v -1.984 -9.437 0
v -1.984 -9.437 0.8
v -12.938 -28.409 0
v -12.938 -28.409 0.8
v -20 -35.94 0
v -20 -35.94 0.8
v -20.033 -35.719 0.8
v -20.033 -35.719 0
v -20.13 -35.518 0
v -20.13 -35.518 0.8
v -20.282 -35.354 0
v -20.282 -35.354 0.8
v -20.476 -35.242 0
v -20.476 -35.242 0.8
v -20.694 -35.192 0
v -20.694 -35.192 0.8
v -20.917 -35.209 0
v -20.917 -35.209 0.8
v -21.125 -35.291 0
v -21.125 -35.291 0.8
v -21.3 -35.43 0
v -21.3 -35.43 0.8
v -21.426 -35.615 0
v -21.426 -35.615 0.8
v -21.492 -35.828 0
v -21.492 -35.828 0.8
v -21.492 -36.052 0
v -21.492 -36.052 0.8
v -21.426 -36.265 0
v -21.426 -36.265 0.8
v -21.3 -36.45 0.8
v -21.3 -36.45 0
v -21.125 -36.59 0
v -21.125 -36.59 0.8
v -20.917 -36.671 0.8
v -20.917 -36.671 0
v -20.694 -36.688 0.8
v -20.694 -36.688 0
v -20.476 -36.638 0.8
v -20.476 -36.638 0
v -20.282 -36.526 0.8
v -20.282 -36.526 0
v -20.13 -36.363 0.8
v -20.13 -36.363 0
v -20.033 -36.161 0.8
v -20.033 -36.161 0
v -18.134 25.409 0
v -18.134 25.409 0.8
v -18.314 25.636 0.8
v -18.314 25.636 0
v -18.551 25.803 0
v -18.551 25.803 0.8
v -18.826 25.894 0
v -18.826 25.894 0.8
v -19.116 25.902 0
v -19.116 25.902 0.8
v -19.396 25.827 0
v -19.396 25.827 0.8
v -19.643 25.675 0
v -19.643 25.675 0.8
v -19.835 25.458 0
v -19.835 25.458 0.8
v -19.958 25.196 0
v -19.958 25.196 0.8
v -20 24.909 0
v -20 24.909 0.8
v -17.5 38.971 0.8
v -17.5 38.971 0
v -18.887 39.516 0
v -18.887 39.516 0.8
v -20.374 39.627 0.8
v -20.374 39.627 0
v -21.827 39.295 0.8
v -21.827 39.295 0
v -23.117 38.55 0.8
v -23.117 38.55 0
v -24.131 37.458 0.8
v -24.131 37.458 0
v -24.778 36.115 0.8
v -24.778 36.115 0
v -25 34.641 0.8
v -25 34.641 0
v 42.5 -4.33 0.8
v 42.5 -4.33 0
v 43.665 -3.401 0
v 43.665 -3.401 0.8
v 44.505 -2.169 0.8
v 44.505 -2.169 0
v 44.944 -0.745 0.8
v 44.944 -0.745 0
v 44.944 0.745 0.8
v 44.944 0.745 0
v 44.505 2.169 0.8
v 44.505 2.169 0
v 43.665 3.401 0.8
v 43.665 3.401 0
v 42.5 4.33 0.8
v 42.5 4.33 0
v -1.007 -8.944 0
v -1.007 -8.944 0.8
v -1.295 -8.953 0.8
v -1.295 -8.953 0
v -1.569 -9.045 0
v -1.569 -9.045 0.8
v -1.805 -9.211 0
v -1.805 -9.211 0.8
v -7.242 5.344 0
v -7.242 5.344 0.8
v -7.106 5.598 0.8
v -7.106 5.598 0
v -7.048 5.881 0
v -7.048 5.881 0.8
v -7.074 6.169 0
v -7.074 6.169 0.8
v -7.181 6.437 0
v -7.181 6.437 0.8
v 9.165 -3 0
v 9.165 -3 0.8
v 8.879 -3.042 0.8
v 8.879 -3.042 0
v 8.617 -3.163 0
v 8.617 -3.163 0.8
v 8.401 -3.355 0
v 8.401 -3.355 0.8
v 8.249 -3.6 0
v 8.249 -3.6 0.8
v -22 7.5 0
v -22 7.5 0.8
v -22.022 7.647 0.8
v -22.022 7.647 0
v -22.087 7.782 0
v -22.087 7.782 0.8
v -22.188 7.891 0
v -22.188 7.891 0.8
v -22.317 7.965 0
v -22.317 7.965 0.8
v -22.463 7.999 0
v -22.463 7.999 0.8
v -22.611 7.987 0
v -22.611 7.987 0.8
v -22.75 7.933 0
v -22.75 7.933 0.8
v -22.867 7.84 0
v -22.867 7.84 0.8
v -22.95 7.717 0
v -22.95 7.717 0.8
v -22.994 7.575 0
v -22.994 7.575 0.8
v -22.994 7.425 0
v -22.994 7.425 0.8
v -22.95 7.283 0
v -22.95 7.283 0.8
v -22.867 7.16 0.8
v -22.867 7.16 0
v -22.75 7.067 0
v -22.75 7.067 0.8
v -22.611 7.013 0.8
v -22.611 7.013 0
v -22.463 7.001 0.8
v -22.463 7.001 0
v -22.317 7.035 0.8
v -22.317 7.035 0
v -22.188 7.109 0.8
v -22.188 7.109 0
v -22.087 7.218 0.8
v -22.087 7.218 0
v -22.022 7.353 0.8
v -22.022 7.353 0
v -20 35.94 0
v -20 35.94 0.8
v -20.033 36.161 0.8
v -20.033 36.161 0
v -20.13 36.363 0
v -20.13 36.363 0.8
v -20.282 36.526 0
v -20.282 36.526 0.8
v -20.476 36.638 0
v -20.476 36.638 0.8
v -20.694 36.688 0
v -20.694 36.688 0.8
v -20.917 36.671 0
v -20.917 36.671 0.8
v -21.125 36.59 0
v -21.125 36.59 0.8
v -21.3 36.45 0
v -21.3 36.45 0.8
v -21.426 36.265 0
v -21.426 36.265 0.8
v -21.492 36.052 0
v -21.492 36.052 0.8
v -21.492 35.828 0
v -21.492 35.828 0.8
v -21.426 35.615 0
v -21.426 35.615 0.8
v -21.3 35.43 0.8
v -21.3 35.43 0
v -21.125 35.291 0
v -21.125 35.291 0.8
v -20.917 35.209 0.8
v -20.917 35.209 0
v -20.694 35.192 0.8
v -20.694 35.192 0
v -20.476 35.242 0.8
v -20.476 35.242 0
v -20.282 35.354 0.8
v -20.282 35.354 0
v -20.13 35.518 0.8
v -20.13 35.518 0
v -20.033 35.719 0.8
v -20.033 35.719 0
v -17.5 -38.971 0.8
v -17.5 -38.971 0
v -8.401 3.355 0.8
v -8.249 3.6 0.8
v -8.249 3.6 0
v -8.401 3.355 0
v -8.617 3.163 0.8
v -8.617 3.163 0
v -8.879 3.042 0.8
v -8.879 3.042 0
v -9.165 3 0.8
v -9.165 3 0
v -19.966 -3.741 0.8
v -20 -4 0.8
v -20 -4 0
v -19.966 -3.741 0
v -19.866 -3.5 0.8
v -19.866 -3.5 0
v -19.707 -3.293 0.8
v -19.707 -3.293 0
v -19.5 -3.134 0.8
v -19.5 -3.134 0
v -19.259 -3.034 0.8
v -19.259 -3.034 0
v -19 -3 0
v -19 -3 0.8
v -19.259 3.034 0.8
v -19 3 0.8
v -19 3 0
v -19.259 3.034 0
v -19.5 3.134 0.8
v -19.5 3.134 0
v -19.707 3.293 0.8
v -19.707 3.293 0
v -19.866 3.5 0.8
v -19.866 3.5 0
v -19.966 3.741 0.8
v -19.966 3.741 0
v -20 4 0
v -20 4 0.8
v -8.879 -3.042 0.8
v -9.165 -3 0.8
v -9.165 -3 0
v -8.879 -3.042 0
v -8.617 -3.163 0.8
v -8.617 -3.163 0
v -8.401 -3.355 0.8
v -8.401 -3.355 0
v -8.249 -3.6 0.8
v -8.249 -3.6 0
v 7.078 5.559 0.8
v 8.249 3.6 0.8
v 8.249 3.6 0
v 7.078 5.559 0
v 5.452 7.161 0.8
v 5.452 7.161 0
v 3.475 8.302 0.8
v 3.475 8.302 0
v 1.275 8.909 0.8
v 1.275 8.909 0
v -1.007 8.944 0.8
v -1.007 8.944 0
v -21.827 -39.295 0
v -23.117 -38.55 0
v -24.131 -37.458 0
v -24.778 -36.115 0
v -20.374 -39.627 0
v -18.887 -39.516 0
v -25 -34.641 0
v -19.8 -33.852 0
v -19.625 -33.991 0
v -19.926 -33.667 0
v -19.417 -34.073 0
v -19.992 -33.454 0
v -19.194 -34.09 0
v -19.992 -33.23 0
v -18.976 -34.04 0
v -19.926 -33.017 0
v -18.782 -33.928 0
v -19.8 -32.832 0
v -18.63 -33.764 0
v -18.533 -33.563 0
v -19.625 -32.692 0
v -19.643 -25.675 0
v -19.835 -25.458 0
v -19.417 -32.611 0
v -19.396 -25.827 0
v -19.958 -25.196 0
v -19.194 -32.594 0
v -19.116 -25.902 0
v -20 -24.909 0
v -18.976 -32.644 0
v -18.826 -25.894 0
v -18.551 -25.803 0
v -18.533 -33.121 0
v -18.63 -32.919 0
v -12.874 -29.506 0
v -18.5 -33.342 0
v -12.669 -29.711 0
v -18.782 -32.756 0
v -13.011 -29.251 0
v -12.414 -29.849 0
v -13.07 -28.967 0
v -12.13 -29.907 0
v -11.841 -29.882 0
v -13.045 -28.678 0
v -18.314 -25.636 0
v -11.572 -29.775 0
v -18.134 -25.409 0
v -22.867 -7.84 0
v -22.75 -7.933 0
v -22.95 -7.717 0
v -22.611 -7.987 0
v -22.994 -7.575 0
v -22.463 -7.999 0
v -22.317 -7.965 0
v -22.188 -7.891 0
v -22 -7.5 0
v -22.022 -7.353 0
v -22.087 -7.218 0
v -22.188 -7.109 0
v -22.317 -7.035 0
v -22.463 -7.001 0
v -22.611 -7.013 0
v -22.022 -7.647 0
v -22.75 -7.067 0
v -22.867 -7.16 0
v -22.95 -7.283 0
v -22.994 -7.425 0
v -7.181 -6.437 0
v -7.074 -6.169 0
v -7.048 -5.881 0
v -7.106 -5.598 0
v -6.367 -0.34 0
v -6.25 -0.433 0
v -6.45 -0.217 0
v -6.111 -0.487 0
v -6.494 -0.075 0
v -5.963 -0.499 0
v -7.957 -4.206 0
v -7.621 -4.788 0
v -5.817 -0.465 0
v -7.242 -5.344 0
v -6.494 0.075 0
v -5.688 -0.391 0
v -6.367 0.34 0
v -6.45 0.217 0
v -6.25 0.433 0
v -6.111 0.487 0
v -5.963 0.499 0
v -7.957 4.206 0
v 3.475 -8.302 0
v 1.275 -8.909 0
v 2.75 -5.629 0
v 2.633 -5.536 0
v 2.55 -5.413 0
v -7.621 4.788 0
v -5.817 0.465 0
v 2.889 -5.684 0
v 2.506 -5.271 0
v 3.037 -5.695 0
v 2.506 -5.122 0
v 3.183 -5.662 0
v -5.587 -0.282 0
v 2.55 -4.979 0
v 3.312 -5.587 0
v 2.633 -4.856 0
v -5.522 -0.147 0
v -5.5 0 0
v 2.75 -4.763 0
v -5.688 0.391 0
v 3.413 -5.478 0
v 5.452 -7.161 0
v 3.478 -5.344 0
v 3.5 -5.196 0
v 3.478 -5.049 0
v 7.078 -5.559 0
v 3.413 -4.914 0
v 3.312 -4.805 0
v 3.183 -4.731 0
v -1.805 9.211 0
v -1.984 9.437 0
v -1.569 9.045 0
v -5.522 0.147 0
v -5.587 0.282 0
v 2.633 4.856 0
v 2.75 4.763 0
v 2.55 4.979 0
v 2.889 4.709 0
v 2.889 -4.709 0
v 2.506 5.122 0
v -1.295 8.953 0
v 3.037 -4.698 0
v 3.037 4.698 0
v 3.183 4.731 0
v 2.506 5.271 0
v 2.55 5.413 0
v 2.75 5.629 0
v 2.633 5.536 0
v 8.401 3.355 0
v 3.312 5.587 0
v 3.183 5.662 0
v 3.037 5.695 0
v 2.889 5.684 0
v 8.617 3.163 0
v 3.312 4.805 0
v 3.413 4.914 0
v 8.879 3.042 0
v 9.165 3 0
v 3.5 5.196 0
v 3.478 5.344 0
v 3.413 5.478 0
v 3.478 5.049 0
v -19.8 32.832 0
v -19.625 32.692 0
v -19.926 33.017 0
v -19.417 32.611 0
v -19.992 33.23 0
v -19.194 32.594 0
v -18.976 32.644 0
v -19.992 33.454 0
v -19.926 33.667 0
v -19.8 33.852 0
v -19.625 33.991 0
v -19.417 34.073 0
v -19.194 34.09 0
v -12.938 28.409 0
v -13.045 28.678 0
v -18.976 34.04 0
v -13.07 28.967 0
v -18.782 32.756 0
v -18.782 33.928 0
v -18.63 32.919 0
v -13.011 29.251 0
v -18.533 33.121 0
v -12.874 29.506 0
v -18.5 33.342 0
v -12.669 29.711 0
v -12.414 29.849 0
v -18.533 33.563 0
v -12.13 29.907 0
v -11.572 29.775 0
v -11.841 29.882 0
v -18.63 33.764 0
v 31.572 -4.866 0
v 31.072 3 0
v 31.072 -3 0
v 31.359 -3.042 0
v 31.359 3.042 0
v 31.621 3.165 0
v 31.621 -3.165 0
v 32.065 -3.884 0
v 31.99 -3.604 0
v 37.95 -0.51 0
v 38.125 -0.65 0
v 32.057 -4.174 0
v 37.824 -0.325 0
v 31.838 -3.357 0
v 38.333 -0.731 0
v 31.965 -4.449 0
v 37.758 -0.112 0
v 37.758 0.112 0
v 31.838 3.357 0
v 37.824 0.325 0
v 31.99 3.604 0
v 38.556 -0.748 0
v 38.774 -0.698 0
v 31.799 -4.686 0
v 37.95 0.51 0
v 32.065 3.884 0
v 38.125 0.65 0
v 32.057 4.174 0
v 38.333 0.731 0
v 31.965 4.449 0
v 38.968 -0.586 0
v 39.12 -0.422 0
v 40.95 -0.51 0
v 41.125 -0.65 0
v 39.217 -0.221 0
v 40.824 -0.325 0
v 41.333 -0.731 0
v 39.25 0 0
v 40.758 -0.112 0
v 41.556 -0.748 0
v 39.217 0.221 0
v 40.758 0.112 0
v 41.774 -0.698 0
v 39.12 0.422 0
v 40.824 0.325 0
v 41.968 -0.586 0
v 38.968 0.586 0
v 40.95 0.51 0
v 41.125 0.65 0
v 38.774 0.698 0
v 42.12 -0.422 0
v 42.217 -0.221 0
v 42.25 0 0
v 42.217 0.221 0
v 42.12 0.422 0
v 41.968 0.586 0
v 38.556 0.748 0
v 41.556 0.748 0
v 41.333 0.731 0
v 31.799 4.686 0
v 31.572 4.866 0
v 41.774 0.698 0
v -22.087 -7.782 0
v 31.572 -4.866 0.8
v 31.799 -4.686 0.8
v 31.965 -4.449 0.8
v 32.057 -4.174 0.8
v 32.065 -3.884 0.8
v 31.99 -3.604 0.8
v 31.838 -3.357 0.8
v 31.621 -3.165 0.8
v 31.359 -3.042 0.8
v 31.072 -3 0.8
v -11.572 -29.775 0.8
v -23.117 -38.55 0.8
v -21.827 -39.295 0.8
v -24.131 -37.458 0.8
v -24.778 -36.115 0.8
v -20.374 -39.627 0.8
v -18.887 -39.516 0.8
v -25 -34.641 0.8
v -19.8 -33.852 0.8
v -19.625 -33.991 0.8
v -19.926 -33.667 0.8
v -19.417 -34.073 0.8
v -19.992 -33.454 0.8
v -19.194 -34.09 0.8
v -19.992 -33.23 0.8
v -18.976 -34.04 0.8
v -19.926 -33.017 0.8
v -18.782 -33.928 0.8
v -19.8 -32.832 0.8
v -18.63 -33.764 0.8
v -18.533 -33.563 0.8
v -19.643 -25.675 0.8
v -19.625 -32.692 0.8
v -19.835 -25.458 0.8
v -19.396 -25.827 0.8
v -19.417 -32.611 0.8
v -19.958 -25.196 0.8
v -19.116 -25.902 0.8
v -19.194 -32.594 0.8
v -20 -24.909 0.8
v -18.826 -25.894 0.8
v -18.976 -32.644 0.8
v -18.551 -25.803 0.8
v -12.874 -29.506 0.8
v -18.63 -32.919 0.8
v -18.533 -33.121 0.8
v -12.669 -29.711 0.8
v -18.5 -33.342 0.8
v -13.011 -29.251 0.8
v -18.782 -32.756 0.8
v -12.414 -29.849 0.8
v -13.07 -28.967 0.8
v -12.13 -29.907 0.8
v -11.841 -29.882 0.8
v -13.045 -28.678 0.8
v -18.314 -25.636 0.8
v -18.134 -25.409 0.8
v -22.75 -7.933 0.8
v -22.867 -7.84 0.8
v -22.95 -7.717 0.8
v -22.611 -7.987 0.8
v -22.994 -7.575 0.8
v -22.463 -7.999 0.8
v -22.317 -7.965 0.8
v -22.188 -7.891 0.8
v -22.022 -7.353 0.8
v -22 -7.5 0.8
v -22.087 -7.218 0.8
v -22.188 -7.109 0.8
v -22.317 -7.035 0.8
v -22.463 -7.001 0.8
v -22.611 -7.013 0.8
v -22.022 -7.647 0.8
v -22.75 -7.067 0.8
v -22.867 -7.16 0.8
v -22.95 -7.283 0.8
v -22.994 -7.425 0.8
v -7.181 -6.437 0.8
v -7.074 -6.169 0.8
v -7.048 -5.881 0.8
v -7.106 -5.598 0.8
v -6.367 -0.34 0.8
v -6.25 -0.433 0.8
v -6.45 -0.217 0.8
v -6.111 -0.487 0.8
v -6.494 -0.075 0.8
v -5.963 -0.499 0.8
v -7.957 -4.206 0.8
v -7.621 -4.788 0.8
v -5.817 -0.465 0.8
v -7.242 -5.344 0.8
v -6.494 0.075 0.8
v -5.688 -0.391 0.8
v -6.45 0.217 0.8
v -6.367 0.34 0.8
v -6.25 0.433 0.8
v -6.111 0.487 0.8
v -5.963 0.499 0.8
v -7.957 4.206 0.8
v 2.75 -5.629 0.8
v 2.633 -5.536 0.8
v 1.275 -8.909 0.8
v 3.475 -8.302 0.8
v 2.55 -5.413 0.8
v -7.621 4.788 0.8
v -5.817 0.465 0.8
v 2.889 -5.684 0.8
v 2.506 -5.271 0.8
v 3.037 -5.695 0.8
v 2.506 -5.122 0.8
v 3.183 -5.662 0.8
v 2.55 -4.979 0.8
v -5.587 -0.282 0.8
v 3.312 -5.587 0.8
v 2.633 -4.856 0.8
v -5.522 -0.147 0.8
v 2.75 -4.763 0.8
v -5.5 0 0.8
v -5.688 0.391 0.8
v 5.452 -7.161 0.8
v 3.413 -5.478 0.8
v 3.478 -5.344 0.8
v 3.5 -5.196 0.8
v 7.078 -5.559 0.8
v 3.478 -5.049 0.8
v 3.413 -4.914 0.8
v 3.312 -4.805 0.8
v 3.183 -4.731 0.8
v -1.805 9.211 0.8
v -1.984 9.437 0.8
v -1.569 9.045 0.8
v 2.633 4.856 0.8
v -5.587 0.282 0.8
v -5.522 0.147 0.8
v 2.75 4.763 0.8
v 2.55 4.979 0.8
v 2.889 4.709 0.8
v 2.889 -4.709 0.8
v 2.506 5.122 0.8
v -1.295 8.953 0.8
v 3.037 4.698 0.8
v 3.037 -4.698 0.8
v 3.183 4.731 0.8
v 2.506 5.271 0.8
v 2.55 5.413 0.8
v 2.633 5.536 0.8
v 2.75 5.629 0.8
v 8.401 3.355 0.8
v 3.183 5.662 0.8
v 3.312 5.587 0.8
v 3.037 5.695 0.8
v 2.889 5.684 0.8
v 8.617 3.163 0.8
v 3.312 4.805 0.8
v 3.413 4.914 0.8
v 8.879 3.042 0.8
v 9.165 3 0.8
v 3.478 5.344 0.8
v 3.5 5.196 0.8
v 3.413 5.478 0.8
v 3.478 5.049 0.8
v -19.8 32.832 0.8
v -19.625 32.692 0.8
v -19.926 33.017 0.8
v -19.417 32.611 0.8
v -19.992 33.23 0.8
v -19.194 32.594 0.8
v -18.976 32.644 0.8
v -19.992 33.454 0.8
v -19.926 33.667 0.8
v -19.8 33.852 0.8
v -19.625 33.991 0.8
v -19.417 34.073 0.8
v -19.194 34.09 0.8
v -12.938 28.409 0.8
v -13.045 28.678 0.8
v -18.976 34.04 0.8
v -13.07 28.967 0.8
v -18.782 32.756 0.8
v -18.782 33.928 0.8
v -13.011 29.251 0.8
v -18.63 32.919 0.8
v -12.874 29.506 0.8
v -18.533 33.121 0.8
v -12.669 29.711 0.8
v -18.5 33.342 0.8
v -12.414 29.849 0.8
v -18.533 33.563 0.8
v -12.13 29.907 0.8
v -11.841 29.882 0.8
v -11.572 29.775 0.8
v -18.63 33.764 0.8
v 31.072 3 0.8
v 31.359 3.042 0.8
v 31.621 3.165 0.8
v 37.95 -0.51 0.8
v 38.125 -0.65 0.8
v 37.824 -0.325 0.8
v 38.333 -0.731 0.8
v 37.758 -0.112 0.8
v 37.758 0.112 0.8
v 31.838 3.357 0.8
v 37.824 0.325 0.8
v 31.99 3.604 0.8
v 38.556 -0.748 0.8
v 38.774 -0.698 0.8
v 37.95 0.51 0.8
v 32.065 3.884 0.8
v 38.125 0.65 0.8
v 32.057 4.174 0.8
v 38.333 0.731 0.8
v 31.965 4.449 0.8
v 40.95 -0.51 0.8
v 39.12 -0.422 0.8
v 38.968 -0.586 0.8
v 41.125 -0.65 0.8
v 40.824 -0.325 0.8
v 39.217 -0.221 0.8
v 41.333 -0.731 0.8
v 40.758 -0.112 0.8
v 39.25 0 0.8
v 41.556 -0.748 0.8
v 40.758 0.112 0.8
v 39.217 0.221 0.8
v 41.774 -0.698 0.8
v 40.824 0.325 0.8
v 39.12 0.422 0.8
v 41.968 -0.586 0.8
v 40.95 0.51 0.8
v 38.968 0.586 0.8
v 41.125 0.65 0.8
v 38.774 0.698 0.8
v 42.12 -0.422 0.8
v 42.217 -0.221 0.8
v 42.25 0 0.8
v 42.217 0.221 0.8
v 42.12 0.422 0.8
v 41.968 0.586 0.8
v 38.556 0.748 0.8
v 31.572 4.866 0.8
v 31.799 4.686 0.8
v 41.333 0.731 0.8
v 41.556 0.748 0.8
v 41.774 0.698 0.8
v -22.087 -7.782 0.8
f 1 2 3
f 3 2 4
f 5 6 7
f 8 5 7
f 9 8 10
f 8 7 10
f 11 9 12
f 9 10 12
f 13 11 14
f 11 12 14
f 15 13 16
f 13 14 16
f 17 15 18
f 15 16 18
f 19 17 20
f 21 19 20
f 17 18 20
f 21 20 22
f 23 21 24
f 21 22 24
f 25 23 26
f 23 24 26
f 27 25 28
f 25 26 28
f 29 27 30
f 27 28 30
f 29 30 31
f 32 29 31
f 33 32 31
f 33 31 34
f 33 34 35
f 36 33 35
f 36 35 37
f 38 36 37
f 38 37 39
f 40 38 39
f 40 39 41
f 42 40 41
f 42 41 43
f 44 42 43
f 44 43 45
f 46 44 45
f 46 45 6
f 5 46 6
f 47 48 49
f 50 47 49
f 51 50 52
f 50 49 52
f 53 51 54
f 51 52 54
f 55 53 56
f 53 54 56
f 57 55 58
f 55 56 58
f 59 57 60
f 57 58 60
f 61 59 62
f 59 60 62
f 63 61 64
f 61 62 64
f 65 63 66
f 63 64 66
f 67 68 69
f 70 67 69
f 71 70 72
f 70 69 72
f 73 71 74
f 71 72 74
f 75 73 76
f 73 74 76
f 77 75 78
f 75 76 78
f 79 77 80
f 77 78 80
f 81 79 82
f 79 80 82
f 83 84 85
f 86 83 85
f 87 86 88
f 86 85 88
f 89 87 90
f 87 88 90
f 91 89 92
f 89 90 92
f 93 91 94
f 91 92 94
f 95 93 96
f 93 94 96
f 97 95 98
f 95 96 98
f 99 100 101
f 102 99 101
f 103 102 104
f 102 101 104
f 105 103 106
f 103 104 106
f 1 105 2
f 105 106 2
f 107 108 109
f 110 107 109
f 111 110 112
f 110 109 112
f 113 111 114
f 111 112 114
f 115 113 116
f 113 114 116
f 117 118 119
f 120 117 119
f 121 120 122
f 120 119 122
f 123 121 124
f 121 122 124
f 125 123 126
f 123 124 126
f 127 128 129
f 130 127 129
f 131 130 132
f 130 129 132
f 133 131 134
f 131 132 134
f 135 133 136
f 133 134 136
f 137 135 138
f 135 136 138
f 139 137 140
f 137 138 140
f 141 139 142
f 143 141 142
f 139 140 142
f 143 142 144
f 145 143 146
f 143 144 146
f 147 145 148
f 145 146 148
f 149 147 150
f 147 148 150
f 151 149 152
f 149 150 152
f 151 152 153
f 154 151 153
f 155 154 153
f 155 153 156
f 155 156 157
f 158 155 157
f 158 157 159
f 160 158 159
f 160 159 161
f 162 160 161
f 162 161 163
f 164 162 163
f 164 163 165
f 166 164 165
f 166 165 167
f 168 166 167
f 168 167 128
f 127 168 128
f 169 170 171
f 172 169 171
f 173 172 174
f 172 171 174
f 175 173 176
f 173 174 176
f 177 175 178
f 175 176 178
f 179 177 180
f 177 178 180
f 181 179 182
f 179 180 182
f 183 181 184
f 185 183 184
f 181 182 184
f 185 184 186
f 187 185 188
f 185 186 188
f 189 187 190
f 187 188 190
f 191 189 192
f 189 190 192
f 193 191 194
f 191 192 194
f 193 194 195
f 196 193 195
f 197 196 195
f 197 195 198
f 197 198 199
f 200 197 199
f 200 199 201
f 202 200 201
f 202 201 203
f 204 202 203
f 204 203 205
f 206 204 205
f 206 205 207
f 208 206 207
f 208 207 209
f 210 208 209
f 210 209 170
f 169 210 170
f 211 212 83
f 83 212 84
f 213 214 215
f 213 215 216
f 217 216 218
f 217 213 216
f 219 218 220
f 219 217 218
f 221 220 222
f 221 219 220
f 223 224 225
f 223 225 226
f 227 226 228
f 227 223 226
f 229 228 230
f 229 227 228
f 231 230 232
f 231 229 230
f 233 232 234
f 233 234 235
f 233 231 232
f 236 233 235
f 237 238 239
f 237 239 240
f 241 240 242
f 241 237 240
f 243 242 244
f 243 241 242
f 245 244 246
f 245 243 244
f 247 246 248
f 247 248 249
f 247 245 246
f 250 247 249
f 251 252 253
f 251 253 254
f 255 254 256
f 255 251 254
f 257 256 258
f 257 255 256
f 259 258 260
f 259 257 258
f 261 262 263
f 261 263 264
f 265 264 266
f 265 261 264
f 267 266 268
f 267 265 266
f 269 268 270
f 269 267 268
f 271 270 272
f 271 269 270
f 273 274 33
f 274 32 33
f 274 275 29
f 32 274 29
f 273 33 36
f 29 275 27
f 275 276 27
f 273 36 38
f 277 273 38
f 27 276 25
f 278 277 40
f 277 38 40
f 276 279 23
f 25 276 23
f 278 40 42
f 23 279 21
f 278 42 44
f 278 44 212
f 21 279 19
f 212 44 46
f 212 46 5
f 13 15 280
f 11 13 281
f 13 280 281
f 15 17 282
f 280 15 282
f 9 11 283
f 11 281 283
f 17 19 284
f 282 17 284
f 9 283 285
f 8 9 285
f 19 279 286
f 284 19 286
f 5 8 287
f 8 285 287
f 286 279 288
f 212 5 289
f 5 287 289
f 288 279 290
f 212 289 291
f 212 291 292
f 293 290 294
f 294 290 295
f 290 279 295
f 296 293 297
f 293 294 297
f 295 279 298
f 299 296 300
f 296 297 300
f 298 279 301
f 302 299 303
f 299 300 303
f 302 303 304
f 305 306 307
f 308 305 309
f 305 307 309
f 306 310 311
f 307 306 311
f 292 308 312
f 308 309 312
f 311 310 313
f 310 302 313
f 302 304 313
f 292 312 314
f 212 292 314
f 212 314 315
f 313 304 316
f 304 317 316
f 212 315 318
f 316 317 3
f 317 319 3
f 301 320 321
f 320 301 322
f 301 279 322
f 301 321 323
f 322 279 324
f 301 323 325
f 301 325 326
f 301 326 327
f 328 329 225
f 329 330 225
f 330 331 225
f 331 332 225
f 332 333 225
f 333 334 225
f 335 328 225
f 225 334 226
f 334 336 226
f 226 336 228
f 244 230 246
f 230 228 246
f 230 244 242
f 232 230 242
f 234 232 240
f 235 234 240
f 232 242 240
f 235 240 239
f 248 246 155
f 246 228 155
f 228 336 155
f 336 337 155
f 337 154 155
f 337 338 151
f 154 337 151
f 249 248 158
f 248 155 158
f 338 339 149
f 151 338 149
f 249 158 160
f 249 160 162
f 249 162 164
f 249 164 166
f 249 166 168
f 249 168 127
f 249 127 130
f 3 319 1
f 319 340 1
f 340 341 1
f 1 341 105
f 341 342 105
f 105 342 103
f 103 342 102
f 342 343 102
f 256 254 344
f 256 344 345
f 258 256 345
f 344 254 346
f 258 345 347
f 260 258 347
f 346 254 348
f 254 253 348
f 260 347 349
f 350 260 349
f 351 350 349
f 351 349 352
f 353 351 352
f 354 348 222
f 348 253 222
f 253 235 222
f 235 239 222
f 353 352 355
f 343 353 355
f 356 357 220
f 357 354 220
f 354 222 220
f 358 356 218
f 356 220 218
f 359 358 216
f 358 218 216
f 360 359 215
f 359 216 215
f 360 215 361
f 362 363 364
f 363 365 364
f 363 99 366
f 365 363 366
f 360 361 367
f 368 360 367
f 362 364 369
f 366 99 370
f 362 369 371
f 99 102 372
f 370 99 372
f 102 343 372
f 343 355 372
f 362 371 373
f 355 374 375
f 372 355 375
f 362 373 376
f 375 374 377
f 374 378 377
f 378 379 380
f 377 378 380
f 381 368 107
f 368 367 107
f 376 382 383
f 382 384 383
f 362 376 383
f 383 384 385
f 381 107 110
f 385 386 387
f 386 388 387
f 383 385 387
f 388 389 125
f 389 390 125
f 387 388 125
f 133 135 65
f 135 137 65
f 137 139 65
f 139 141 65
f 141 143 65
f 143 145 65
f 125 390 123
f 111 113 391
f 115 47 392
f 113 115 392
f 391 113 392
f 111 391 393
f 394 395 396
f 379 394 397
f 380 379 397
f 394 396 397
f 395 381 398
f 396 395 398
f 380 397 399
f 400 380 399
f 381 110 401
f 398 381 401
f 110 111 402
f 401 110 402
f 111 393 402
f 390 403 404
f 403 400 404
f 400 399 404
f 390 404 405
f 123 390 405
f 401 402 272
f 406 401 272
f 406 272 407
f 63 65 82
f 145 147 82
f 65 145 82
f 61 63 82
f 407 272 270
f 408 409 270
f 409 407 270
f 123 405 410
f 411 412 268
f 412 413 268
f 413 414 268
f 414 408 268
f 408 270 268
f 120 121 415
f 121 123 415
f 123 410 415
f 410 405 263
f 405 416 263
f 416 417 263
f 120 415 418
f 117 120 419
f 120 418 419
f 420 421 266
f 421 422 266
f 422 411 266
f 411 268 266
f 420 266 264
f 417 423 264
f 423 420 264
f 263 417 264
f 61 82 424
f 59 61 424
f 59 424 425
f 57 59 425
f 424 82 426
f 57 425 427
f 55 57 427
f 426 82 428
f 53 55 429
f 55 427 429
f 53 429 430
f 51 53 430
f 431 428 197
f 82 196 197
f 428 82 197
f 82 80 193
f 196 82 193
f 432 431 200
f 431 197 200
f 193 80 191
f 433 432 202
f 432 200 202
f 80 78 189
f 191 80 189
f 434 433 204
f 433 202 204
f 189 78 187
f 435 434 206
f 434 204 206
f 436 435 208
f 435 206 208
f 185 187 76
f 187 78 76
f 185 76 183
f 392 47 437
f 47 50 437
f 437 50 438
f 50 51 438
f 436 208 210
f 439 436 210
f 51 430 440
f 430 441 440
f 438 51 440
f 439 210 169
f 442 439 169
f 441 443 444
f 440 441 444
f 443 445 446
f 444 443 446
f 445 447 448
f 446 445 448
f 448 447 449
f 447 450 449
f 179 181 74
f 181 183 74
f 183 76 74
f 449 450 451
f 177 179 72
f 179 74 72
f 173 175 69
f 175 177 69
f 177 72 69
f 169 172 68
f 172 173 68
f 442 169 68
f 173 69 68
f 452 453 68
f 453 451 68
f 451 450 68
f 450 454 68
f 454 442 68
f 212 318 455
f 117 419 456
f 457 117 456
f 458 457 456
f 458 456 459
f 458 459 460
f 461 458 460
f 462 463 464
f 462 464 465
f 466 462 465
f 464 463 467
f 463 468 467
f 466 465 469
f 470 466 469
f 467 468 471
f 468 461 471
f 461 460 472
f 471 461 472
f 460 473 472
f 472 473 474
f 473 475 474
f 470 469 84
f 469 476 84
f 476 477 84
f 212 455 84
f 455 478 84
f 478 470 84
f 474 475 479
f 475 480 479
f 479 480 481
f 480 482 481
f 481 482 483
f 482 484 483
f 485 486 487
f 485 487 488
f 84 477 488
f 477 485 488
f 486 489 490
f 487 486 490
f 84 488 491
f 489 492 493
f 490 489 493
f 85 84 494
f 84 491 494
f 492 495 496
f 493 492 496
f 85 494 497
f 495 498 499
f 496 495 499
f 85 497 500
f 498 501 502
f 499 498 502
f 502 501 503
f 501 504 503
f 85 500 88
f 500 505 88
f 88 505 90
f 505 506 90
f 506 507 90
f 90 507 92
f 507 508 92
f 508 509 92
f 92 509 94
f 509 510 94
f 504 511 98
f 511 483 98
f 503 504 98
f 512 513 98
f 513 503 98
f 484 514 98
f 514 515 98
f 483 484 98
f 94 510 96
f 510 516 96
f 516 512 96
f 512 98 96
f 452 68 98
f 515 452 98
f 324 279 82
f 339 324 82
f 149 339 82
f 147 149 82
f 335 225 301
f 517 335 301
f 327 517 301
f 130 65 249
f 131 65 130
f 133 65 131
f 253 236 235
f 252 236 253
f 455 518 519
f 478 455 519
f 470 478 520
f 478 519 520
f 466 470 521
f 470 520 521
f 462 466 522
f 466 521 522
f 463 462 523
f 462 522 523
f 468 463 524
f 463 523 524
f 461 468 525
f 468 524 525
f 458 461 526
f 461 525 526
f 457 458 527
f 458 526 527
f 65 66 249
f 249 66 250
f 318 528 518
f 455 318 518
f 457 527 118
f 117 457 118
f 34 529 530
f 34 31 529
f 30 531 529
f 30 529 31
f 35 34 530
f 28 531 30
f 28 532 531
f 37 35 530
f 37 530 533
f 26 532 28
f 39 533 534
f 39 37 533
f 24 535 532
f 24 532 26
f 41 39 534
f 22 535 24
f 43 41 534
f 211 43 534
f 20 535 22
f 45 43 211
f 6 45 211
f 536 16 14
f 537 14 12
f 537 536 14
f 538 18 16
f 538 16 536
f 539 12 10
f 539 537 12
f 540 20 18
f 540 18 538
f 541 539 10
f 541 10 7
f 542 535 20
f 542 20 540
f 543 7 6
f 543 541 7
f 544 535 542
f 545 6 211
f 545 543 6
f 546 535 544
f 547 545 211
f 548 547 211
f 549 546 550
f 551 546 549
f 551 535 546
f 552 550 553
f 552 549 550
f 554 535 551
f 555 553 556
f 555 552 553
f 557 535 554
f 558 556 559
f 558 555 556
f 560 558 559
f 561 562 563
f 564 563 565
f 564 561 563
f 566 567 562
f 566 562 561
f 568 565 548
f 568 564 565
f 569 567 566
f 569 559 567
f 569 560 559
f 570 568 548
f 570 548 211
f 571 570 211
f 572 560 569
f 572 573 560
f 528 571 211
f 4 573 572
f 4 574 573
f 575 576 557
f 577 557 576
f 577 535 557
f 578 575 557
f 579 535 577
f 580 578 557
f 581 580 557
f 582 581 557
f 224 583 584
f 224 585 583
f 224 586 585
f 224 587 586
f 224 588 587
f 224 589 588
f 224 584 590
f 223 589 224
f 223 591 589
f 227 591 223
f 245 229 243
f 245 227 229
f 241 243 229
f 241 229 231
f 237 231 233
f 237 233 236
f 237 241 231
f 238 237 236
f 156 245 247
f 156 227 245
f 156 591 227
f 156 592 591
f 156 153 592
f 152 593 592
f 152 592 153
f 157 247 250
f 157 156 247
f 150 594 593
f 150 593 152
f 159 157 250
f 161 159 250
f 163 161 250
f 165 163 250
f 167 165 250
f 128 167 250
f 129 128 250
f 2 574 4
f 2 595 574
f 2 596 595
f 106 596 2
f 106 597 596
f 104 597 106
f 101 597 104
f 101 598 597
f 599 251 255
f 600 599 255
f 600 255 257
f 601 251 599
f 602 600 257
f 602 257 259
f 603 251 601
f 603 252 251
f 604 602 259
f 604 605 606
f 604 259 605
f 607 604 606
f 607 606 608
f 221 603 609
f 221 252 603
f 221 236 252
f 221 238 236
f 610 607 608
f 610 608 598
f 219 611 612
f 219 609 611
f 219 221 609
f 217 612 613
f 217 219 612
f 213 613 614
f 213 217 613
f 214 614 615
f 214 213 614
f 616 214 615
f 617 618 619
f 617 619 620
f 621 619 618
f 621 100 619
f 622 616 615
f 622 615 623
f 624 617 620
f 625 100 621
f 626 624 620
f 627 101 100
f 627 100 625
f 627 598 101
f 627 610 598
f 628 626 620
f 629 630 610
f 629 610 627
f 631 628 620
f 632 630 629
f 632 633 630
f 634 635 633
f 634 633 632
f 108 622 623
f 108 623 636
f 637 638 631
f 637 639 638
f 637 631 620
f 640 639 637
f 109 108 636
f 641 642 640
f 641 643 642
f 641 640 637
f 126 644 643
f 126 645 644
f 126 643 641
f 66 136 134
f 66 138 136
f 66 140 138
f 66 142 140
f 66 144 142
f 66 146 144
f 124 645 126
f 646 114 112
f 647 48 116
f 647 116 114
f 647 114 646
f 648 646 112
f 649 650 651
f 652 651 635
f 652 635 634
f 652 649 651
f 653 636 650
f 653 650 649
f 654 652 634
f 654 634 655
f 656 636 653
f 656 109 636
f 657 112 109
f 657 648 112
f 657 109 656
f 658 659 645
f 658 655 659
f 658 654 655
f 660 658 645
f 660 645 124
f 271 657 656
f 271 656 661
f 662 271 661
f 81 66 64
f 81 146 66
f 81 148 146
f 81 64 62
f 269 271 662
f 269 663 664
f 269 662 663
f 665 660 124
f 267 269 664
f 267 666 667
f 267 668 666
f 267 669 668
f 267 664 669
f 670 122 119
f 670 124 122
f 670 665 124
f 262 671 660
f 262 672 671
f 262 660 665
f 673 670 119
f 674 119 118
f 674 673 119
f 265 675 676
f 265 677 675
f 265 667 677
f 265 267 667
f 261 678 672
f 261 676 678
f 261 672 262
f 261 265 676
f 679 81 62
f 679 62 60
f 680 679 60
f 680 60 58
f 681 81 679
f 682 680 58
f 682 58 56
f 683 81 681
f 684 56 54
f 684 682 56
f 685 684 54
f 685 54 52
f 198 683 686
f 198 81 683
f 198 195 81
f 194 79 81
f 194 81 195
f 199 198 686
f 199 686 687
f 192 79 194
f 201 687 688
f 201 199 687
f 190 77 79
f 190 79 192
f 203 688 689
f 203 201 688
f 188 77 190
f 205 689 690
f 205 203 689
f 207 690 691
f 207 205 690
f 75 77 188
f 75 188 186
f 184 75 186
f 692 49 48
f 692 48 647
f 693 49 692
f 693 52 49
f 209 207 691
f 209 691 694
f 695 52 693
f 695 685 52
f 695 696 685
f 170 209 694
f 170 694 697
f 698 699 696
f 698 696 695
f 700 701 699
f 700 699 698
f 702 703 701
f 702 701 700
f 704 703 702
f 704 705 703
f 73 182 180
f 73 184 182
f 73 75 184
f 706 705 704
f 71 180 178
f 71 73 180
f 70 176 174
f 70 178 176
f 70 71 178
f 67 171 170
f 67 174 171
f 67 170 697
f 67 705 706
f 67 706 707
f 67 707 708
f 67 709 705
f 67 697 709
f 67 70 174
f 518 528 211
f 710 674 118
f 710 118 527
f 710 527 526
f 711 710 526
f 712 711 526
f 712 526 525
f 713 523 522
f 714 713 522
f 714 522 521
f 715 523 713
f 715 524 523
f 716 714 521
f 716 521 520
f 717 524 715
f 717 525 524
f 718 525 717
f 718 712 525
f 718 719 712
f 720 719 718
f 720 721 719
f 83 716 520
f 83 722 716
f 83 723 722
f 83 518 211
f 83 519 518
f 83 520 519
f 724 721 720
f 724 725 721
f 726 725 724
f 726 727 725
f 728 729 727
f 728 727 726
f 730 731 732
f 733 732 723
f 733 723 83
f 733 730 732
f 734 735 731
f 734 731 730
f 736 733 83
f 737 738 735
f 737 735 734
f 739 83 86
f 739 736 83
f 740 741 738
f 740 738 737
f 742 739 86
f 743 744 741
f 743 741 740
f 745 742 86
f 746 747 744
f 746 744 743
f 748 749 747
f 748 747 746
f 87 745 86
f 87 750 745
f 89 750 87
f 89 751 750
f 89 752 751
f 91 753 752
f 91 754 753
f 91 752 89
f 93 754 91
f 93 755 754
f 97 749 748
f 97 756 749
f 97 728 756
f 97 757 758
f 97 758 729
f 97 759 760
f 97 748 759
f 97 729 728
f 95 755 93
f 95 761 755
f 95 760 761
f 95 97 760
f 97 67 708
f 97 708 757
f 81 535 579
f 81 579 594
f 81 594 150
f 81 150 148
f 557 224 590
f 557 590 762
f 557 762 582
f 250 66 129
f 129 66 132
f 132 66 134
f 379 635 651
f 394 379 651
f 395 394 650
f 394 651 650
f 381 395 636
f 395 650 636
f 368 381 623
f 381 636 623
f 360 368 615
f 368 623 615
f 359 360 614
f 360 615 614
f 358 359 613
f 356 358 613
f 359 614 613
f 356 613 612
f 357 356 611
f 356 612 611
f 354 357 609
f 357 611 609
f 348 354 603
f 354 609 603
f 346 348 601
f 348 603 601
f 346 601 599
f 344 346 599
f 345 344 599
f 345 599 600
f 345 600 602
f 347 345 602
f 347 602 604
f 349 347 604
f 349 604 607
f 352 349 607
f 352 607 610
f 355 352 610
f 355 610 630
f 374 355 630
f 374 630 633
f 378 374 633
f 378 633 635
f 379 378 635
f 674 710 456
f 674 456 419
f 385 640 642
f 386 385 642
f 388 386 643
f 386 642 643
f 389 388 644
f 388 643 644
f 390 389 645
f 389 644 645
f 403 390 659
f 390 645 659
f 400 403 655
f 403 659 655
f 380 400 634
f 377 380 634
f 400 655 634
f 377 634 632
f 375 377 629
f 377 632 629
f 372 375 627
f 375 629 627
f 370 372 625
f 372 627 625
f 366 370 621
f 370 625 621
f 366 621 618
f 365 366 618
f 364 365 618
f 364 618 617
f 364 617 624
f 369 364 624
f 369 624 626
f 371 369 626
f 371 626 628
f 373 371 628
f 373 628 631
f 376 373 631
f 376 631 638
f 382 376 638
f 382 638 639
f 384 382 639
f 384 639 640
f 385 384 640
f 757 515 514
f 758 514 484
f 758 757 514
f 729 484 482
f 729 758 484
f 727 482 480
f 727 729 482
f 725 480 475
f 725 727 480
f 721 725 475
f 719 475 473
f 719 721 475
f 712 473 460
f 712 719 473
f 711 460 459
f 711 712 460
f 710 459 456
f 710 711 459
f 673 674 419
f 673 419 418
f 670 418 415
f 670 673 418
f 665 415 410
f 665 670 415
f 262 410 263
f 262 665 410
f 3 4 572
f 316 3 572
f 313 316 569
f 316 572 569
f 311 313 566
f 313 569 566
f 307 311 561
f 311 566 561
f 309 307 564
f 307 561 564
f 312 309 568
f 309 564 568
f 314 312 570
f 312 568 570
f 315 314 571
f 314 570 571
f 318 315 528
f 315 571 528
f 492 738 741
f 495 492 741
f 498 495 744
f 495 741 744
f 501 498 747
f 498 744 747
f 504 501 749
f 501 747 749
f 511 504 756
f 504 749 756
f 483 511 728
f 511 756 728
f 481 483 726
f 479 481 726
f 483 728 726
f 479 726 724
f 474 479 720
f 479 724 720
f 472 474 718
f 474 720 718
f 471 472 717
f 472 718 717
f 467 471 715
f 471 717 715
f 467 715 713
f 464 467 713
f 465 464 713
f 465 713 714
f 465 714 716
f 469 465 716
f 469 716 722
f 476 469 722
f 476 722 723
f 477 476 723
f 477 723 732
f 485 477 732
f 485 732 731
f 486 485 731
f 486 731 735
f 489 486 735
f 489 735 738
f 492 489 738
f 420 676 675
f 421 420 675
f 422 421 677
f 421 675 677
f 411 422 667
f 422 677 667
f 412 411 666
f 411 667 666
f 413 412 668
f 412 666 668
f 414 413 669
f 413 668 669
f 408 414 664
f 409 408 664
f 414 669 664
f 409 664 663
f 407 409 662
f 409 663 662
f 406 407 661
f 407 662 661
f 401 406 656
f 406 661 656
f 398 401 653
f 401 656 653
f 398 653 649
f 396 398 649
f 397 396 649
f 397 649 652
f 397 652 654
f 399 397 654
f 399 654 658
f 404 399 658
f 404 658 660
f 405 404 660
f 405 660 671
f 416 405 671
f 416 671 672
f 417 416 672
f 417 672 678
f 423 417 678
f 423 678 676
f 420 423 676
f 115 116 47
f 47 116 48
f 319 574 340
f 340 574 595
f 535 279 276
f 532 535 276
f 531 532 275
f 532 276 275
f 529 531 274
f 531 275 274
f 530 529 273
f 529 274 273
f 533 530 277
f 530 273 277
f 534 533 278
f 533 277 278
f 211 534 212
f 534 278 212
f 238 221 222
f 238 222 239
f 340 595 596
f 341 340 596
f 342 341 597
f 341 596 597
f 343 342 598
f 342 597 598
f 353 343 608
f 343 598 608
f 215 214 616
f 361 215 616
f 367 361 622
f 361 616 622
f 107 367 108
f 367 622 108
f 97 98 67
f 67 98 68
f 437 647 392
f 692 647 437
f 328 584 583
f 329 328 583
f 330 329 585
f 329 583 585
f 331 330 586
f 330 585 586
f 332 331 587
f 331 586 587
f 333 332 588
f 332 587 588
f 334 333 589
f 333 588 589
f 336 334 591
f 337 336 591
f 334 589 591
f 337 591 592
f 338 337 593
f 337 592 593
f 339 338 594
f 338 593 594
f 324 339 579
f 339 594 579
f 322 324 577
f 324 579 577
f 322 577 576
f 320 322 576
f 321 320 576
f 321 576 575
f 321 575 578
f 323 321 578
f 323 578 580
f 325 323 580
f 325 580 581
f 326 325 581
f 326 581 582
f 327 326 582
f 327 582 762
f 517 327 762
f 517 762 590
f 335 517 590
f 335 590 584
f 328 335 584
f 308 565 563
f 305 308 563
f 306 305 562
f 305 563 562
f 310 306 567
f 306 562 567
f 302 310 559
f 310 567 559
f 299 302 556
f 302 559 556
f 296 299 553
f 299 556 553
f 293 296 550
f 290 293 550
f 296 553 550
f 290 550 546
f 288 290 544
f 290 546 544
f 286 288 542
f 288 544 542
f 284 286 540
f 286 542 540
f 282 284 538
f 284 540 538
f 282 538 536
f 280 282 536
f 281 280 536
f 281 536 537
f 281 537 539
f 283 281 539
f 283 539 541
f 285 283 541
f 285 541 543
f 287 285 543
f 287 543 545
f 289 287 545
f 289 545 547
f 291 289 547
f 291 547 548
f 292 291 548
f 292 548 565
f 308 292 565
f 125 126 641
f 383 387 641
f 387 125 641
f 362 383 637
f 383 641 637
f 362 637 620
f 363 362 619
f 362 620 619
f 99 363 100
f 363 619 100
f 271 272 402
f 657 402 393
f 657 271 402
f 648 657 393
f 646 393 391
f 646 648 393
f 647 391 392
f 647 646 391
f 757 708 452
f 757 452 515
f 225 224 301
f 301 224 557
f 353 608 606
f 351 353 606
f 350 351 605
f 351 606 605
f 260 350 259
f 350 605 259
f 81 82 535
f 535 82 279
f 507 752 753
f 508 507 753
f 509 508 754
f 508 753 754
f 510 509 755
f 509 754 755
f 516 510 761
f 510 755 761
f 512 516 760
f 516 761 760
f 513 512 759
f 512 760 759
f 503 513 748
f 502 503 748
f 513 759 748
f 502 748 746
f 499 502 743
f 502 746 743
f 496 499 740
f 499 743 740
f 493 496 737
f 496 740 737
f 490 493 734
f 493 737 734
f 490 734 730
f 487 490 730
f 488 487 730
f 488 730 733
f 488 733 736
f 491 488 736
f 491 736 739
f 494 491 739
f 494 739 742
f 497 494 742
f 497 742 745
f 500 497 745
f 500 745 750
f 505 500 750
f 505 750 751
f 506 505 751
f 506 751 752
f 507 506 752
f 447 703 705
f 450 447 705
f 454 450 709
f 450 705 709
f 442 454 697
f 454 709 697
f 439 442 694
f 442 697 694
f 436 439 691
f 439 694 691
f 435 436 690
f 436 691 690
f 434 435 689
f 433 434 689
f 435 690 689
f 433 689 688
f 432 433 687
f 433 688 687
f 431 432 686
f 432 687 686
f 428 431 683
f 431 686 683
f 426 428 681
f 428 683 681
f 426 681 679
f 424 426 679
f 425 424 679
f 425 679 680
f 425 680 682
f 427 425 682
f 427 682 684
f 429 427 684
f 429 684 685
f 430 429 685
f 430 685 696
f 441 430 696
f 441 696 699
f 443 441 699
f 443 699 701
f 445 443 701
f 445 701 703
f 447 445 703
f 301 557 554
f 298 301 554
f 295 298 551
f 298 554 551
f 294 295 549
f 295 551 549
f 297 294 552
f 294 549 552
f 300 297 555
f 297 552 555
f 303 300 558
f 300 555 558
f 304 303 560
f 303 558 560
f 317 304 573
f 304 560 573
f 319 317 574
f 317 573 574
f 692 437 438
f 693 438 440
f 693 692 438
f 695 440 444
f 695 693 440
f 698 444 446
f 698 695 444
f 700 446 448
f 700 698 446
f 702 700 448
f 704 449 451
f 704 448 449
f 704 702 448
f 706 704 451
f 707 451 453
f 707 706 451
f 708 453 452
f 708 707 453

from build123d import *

# Parameters (mm, degrees)
BOARD_DEPTH     = 0.8
CUT_DEPTH       = 60.975412975
HOLESSKE_R      = 0.5
HOLES_DEPTH     = 60.975412975
HOLES2SKE_R     = 0.75
HOLES2_DEPTH    = 60.975412975
HOLES3SKE_R     = 0.5
HOLES3_DEPTH    = 60.975412975
REINFORCE_START = 0.8
REINFORCE_DEPTH = 0.8


with BuildPart() as part:
    # BoardSke → Board (new body)
    with BuildSketch(Plane.XY):
        with BuildLine():
            Line((42.5, 4.330127019), (-17.5, 38.97114317))
            ThreePointArc((-17.5, 38.97114317), (-22.5, 38.97114317), (-25, 34.641016151))
            Line((-25, 34.641016151), (-25, -34.641016151))
            ThreePointArc((-25, -34.641016151), (-22.5, -38.97114317), (-17.5, -38.97114317))
            Line((-17.5, -38.97114317), (42.5, -4.330127019))
            ThreePointArc((42.5, -4.330127019), (45, 0), (42.5, 4.330127019))
        make_face()
    extrude(amount=BOARD_DEPTH)

    # CutSke → Cut (cut, through all)
    with BuildSketch(Plane.XY.offset(0.8)):
        with BuildLine():
            Line((31.07179677, 3), (9.16515139, 3))
            ThreePointArc((9.16515139, 3), (8.617428832, 3.163339973), (8.248636251, 3.6))
            ThreePointArc((8.248636251, 3.6), (4.5, 7.794228634), (-1.006626672, 8.94352854))
            ThreePointArc((-1.006626672, 8.94352854), (-1.569181638, 9.044582271), (-1.984499484, 9.437253933))
            Line((-1.984499484, 9.437253933), (-12.937822174, 28.408965344))
            ThreePointArc((-12.937822174, 28.408965344), (-12.778903551, 29.616072125), (-11.57179677, 29.774990748))
            Line((-11.57179677, 29.774990748), (31.57179677, 4.866025404))
            ThreePointArc((31.57179677, 4.866025404), (32.037722596, 3.741180955), (31.07179677, 3))
        make_face()
        with BuildLine():
            Line((31.07179677, -3), (9.16515139, -3))
            ThreePointArc((9.16515139, -3), (8.617428832, -3.163339973), (8.248636251, -3.6))
            ThreePointArc((8.248636251, -3.6), (4.5, -7.794228634), (-1.006626672, -8.94352854))
            ThreePointArc((-1.006626672, -8.94352854), (-1.569181638, -9.044582271), (-1.984499484, -9.437253933))
            Line((-1.984499484, -9.437253933), (-12.937822174, -28.408965344))
            ThreePointArc((-12.937822174, -28.408965344), (-12.778903551, -29.616072125), (-11.57179677, -29.774990748))
            Line((-11.57179677, -29.774990748), (31.57179677, -4.866025404))
            ThreePointArc((31.57179677, -4.866025404), (32.037722596, -3.741180955), (31.07179677, -3))
        make_face()
        with BuildLine():
            Line((-18.133974596, -25.408965344), (-7.180651906, -6.437253933))
            ThreePointArc((-7.180651906, -6.437253933), (-7.048247194, -5.881242297), (-7.242009579, -5.34352854))
            ThreePointArc((-7.242009579, -5.34352854), (-9, 0), (-7.242009579, 5.34352854))
            ThreePointArc((-7.242009579, 5.34352854), (-7.048247194, 5.881242297), (-7.180651906, 6.437253933))
            Line((-7.180651906, 6.437253933), (-18.133974596, 25.408965344))
            ThreePointArc((-18.133974596, 25.408965344), (-19.258819045, 25.87489117), (-20, 24.908965344))
            Line((-20, 24.908965344), (-20, -24.908965344))
            ThreePointArc((-20, -24.908965344), (-19.258819045, -25.87489117), (-18.133974596, -25.408965344))
        make_face()
    extrude(amount=-CUT_DEPTH, mode=Mode.SUBTRACT)

    # HolesSke → Holes (cut, through all)
    with BuildSketch(Plane.XY.offset(0.8)):
        with Locations((-6, 0)):
            Circle(HOLESSKE_R)
        with Locations((3, 5.196152423)):
            Circle(HOLESSKE_R)
        with Locations((3, -5.196152423)):
            Circle(HOLESSKE_R)
    extrude(amount=-HOLES_DEPTH, mode=Mode.SUBTRACT)

    # Holes2Ske → Holes2 (cut, through all)
    with BuildSketch(Plane.XY.offset(0.8)):
        with Locations((38.5, 0)):
            Circle(HOLES2SKE_R)
        with Locations((41.5, 0)):
            Circle(HOLES2SKE_R)
        with Locations((-19.25, -33.341978046)):
            Circle(HOLES2SKE_R)
        with Locations((-20.75, -35.940054257)):
            Circle(HOLES2SKE_R)
        with Locations((-19.25, 33.341978046)):
            Circle(HOLES2SKE_R)
        with Locations((-20.75, 35.940054257)):
            Circle(HOLES2SKE_R)
    extrude(amount=-HOLES2_DEPTH, mode=Mode.SUBTRACT)

    # Holes3Ske → Holes3 (cut, through all)
    with BuildSketch(Plane.XY.offset(0.8)):
        with Locations((-22.5, 7.5)):
            Circle(HOLES3SKE_R)
        with Locations((-22.5, -7.5)):
            Circle(HOLES3SKE_R)
    extrude(amount=-HOLES3_DEPTH, mode=Mode.SUBTRACT)

    # ReinforceSke → Reinforce (add)
    with BuildSketch(Plane.XY.offset(REINFORCE_START)):
        with BuildLine():
            Line((-9.16515139, 3), (-19, 3))
            ThreePointArc((-19, 3), (-19.707106781, 3.292893219), (-20, 4))
            Line((-20, 4), (-20, -4))
            ThreePointArc((-20, -4), (-19.707106781, -3.292893219), (-19, -3))
            Line((-19, -3), (-9.16515139, -3))
            ThreePointArc((-9.16515139, -3), (-8.617428832, -3.163339973), (-8.248636251, -3.6))
            ThreePointArc((-8.248636251, -3.6), (-9, 0), (-8.248636251, 3.6))
            ThreePointArc((-8.248636251, 3.6), (-8.617428832, 3.163339973), (-9.16515139, 3))
        make_face()
    extrude(amount=-REINFORCE_DEPTH)


solid = part.part
